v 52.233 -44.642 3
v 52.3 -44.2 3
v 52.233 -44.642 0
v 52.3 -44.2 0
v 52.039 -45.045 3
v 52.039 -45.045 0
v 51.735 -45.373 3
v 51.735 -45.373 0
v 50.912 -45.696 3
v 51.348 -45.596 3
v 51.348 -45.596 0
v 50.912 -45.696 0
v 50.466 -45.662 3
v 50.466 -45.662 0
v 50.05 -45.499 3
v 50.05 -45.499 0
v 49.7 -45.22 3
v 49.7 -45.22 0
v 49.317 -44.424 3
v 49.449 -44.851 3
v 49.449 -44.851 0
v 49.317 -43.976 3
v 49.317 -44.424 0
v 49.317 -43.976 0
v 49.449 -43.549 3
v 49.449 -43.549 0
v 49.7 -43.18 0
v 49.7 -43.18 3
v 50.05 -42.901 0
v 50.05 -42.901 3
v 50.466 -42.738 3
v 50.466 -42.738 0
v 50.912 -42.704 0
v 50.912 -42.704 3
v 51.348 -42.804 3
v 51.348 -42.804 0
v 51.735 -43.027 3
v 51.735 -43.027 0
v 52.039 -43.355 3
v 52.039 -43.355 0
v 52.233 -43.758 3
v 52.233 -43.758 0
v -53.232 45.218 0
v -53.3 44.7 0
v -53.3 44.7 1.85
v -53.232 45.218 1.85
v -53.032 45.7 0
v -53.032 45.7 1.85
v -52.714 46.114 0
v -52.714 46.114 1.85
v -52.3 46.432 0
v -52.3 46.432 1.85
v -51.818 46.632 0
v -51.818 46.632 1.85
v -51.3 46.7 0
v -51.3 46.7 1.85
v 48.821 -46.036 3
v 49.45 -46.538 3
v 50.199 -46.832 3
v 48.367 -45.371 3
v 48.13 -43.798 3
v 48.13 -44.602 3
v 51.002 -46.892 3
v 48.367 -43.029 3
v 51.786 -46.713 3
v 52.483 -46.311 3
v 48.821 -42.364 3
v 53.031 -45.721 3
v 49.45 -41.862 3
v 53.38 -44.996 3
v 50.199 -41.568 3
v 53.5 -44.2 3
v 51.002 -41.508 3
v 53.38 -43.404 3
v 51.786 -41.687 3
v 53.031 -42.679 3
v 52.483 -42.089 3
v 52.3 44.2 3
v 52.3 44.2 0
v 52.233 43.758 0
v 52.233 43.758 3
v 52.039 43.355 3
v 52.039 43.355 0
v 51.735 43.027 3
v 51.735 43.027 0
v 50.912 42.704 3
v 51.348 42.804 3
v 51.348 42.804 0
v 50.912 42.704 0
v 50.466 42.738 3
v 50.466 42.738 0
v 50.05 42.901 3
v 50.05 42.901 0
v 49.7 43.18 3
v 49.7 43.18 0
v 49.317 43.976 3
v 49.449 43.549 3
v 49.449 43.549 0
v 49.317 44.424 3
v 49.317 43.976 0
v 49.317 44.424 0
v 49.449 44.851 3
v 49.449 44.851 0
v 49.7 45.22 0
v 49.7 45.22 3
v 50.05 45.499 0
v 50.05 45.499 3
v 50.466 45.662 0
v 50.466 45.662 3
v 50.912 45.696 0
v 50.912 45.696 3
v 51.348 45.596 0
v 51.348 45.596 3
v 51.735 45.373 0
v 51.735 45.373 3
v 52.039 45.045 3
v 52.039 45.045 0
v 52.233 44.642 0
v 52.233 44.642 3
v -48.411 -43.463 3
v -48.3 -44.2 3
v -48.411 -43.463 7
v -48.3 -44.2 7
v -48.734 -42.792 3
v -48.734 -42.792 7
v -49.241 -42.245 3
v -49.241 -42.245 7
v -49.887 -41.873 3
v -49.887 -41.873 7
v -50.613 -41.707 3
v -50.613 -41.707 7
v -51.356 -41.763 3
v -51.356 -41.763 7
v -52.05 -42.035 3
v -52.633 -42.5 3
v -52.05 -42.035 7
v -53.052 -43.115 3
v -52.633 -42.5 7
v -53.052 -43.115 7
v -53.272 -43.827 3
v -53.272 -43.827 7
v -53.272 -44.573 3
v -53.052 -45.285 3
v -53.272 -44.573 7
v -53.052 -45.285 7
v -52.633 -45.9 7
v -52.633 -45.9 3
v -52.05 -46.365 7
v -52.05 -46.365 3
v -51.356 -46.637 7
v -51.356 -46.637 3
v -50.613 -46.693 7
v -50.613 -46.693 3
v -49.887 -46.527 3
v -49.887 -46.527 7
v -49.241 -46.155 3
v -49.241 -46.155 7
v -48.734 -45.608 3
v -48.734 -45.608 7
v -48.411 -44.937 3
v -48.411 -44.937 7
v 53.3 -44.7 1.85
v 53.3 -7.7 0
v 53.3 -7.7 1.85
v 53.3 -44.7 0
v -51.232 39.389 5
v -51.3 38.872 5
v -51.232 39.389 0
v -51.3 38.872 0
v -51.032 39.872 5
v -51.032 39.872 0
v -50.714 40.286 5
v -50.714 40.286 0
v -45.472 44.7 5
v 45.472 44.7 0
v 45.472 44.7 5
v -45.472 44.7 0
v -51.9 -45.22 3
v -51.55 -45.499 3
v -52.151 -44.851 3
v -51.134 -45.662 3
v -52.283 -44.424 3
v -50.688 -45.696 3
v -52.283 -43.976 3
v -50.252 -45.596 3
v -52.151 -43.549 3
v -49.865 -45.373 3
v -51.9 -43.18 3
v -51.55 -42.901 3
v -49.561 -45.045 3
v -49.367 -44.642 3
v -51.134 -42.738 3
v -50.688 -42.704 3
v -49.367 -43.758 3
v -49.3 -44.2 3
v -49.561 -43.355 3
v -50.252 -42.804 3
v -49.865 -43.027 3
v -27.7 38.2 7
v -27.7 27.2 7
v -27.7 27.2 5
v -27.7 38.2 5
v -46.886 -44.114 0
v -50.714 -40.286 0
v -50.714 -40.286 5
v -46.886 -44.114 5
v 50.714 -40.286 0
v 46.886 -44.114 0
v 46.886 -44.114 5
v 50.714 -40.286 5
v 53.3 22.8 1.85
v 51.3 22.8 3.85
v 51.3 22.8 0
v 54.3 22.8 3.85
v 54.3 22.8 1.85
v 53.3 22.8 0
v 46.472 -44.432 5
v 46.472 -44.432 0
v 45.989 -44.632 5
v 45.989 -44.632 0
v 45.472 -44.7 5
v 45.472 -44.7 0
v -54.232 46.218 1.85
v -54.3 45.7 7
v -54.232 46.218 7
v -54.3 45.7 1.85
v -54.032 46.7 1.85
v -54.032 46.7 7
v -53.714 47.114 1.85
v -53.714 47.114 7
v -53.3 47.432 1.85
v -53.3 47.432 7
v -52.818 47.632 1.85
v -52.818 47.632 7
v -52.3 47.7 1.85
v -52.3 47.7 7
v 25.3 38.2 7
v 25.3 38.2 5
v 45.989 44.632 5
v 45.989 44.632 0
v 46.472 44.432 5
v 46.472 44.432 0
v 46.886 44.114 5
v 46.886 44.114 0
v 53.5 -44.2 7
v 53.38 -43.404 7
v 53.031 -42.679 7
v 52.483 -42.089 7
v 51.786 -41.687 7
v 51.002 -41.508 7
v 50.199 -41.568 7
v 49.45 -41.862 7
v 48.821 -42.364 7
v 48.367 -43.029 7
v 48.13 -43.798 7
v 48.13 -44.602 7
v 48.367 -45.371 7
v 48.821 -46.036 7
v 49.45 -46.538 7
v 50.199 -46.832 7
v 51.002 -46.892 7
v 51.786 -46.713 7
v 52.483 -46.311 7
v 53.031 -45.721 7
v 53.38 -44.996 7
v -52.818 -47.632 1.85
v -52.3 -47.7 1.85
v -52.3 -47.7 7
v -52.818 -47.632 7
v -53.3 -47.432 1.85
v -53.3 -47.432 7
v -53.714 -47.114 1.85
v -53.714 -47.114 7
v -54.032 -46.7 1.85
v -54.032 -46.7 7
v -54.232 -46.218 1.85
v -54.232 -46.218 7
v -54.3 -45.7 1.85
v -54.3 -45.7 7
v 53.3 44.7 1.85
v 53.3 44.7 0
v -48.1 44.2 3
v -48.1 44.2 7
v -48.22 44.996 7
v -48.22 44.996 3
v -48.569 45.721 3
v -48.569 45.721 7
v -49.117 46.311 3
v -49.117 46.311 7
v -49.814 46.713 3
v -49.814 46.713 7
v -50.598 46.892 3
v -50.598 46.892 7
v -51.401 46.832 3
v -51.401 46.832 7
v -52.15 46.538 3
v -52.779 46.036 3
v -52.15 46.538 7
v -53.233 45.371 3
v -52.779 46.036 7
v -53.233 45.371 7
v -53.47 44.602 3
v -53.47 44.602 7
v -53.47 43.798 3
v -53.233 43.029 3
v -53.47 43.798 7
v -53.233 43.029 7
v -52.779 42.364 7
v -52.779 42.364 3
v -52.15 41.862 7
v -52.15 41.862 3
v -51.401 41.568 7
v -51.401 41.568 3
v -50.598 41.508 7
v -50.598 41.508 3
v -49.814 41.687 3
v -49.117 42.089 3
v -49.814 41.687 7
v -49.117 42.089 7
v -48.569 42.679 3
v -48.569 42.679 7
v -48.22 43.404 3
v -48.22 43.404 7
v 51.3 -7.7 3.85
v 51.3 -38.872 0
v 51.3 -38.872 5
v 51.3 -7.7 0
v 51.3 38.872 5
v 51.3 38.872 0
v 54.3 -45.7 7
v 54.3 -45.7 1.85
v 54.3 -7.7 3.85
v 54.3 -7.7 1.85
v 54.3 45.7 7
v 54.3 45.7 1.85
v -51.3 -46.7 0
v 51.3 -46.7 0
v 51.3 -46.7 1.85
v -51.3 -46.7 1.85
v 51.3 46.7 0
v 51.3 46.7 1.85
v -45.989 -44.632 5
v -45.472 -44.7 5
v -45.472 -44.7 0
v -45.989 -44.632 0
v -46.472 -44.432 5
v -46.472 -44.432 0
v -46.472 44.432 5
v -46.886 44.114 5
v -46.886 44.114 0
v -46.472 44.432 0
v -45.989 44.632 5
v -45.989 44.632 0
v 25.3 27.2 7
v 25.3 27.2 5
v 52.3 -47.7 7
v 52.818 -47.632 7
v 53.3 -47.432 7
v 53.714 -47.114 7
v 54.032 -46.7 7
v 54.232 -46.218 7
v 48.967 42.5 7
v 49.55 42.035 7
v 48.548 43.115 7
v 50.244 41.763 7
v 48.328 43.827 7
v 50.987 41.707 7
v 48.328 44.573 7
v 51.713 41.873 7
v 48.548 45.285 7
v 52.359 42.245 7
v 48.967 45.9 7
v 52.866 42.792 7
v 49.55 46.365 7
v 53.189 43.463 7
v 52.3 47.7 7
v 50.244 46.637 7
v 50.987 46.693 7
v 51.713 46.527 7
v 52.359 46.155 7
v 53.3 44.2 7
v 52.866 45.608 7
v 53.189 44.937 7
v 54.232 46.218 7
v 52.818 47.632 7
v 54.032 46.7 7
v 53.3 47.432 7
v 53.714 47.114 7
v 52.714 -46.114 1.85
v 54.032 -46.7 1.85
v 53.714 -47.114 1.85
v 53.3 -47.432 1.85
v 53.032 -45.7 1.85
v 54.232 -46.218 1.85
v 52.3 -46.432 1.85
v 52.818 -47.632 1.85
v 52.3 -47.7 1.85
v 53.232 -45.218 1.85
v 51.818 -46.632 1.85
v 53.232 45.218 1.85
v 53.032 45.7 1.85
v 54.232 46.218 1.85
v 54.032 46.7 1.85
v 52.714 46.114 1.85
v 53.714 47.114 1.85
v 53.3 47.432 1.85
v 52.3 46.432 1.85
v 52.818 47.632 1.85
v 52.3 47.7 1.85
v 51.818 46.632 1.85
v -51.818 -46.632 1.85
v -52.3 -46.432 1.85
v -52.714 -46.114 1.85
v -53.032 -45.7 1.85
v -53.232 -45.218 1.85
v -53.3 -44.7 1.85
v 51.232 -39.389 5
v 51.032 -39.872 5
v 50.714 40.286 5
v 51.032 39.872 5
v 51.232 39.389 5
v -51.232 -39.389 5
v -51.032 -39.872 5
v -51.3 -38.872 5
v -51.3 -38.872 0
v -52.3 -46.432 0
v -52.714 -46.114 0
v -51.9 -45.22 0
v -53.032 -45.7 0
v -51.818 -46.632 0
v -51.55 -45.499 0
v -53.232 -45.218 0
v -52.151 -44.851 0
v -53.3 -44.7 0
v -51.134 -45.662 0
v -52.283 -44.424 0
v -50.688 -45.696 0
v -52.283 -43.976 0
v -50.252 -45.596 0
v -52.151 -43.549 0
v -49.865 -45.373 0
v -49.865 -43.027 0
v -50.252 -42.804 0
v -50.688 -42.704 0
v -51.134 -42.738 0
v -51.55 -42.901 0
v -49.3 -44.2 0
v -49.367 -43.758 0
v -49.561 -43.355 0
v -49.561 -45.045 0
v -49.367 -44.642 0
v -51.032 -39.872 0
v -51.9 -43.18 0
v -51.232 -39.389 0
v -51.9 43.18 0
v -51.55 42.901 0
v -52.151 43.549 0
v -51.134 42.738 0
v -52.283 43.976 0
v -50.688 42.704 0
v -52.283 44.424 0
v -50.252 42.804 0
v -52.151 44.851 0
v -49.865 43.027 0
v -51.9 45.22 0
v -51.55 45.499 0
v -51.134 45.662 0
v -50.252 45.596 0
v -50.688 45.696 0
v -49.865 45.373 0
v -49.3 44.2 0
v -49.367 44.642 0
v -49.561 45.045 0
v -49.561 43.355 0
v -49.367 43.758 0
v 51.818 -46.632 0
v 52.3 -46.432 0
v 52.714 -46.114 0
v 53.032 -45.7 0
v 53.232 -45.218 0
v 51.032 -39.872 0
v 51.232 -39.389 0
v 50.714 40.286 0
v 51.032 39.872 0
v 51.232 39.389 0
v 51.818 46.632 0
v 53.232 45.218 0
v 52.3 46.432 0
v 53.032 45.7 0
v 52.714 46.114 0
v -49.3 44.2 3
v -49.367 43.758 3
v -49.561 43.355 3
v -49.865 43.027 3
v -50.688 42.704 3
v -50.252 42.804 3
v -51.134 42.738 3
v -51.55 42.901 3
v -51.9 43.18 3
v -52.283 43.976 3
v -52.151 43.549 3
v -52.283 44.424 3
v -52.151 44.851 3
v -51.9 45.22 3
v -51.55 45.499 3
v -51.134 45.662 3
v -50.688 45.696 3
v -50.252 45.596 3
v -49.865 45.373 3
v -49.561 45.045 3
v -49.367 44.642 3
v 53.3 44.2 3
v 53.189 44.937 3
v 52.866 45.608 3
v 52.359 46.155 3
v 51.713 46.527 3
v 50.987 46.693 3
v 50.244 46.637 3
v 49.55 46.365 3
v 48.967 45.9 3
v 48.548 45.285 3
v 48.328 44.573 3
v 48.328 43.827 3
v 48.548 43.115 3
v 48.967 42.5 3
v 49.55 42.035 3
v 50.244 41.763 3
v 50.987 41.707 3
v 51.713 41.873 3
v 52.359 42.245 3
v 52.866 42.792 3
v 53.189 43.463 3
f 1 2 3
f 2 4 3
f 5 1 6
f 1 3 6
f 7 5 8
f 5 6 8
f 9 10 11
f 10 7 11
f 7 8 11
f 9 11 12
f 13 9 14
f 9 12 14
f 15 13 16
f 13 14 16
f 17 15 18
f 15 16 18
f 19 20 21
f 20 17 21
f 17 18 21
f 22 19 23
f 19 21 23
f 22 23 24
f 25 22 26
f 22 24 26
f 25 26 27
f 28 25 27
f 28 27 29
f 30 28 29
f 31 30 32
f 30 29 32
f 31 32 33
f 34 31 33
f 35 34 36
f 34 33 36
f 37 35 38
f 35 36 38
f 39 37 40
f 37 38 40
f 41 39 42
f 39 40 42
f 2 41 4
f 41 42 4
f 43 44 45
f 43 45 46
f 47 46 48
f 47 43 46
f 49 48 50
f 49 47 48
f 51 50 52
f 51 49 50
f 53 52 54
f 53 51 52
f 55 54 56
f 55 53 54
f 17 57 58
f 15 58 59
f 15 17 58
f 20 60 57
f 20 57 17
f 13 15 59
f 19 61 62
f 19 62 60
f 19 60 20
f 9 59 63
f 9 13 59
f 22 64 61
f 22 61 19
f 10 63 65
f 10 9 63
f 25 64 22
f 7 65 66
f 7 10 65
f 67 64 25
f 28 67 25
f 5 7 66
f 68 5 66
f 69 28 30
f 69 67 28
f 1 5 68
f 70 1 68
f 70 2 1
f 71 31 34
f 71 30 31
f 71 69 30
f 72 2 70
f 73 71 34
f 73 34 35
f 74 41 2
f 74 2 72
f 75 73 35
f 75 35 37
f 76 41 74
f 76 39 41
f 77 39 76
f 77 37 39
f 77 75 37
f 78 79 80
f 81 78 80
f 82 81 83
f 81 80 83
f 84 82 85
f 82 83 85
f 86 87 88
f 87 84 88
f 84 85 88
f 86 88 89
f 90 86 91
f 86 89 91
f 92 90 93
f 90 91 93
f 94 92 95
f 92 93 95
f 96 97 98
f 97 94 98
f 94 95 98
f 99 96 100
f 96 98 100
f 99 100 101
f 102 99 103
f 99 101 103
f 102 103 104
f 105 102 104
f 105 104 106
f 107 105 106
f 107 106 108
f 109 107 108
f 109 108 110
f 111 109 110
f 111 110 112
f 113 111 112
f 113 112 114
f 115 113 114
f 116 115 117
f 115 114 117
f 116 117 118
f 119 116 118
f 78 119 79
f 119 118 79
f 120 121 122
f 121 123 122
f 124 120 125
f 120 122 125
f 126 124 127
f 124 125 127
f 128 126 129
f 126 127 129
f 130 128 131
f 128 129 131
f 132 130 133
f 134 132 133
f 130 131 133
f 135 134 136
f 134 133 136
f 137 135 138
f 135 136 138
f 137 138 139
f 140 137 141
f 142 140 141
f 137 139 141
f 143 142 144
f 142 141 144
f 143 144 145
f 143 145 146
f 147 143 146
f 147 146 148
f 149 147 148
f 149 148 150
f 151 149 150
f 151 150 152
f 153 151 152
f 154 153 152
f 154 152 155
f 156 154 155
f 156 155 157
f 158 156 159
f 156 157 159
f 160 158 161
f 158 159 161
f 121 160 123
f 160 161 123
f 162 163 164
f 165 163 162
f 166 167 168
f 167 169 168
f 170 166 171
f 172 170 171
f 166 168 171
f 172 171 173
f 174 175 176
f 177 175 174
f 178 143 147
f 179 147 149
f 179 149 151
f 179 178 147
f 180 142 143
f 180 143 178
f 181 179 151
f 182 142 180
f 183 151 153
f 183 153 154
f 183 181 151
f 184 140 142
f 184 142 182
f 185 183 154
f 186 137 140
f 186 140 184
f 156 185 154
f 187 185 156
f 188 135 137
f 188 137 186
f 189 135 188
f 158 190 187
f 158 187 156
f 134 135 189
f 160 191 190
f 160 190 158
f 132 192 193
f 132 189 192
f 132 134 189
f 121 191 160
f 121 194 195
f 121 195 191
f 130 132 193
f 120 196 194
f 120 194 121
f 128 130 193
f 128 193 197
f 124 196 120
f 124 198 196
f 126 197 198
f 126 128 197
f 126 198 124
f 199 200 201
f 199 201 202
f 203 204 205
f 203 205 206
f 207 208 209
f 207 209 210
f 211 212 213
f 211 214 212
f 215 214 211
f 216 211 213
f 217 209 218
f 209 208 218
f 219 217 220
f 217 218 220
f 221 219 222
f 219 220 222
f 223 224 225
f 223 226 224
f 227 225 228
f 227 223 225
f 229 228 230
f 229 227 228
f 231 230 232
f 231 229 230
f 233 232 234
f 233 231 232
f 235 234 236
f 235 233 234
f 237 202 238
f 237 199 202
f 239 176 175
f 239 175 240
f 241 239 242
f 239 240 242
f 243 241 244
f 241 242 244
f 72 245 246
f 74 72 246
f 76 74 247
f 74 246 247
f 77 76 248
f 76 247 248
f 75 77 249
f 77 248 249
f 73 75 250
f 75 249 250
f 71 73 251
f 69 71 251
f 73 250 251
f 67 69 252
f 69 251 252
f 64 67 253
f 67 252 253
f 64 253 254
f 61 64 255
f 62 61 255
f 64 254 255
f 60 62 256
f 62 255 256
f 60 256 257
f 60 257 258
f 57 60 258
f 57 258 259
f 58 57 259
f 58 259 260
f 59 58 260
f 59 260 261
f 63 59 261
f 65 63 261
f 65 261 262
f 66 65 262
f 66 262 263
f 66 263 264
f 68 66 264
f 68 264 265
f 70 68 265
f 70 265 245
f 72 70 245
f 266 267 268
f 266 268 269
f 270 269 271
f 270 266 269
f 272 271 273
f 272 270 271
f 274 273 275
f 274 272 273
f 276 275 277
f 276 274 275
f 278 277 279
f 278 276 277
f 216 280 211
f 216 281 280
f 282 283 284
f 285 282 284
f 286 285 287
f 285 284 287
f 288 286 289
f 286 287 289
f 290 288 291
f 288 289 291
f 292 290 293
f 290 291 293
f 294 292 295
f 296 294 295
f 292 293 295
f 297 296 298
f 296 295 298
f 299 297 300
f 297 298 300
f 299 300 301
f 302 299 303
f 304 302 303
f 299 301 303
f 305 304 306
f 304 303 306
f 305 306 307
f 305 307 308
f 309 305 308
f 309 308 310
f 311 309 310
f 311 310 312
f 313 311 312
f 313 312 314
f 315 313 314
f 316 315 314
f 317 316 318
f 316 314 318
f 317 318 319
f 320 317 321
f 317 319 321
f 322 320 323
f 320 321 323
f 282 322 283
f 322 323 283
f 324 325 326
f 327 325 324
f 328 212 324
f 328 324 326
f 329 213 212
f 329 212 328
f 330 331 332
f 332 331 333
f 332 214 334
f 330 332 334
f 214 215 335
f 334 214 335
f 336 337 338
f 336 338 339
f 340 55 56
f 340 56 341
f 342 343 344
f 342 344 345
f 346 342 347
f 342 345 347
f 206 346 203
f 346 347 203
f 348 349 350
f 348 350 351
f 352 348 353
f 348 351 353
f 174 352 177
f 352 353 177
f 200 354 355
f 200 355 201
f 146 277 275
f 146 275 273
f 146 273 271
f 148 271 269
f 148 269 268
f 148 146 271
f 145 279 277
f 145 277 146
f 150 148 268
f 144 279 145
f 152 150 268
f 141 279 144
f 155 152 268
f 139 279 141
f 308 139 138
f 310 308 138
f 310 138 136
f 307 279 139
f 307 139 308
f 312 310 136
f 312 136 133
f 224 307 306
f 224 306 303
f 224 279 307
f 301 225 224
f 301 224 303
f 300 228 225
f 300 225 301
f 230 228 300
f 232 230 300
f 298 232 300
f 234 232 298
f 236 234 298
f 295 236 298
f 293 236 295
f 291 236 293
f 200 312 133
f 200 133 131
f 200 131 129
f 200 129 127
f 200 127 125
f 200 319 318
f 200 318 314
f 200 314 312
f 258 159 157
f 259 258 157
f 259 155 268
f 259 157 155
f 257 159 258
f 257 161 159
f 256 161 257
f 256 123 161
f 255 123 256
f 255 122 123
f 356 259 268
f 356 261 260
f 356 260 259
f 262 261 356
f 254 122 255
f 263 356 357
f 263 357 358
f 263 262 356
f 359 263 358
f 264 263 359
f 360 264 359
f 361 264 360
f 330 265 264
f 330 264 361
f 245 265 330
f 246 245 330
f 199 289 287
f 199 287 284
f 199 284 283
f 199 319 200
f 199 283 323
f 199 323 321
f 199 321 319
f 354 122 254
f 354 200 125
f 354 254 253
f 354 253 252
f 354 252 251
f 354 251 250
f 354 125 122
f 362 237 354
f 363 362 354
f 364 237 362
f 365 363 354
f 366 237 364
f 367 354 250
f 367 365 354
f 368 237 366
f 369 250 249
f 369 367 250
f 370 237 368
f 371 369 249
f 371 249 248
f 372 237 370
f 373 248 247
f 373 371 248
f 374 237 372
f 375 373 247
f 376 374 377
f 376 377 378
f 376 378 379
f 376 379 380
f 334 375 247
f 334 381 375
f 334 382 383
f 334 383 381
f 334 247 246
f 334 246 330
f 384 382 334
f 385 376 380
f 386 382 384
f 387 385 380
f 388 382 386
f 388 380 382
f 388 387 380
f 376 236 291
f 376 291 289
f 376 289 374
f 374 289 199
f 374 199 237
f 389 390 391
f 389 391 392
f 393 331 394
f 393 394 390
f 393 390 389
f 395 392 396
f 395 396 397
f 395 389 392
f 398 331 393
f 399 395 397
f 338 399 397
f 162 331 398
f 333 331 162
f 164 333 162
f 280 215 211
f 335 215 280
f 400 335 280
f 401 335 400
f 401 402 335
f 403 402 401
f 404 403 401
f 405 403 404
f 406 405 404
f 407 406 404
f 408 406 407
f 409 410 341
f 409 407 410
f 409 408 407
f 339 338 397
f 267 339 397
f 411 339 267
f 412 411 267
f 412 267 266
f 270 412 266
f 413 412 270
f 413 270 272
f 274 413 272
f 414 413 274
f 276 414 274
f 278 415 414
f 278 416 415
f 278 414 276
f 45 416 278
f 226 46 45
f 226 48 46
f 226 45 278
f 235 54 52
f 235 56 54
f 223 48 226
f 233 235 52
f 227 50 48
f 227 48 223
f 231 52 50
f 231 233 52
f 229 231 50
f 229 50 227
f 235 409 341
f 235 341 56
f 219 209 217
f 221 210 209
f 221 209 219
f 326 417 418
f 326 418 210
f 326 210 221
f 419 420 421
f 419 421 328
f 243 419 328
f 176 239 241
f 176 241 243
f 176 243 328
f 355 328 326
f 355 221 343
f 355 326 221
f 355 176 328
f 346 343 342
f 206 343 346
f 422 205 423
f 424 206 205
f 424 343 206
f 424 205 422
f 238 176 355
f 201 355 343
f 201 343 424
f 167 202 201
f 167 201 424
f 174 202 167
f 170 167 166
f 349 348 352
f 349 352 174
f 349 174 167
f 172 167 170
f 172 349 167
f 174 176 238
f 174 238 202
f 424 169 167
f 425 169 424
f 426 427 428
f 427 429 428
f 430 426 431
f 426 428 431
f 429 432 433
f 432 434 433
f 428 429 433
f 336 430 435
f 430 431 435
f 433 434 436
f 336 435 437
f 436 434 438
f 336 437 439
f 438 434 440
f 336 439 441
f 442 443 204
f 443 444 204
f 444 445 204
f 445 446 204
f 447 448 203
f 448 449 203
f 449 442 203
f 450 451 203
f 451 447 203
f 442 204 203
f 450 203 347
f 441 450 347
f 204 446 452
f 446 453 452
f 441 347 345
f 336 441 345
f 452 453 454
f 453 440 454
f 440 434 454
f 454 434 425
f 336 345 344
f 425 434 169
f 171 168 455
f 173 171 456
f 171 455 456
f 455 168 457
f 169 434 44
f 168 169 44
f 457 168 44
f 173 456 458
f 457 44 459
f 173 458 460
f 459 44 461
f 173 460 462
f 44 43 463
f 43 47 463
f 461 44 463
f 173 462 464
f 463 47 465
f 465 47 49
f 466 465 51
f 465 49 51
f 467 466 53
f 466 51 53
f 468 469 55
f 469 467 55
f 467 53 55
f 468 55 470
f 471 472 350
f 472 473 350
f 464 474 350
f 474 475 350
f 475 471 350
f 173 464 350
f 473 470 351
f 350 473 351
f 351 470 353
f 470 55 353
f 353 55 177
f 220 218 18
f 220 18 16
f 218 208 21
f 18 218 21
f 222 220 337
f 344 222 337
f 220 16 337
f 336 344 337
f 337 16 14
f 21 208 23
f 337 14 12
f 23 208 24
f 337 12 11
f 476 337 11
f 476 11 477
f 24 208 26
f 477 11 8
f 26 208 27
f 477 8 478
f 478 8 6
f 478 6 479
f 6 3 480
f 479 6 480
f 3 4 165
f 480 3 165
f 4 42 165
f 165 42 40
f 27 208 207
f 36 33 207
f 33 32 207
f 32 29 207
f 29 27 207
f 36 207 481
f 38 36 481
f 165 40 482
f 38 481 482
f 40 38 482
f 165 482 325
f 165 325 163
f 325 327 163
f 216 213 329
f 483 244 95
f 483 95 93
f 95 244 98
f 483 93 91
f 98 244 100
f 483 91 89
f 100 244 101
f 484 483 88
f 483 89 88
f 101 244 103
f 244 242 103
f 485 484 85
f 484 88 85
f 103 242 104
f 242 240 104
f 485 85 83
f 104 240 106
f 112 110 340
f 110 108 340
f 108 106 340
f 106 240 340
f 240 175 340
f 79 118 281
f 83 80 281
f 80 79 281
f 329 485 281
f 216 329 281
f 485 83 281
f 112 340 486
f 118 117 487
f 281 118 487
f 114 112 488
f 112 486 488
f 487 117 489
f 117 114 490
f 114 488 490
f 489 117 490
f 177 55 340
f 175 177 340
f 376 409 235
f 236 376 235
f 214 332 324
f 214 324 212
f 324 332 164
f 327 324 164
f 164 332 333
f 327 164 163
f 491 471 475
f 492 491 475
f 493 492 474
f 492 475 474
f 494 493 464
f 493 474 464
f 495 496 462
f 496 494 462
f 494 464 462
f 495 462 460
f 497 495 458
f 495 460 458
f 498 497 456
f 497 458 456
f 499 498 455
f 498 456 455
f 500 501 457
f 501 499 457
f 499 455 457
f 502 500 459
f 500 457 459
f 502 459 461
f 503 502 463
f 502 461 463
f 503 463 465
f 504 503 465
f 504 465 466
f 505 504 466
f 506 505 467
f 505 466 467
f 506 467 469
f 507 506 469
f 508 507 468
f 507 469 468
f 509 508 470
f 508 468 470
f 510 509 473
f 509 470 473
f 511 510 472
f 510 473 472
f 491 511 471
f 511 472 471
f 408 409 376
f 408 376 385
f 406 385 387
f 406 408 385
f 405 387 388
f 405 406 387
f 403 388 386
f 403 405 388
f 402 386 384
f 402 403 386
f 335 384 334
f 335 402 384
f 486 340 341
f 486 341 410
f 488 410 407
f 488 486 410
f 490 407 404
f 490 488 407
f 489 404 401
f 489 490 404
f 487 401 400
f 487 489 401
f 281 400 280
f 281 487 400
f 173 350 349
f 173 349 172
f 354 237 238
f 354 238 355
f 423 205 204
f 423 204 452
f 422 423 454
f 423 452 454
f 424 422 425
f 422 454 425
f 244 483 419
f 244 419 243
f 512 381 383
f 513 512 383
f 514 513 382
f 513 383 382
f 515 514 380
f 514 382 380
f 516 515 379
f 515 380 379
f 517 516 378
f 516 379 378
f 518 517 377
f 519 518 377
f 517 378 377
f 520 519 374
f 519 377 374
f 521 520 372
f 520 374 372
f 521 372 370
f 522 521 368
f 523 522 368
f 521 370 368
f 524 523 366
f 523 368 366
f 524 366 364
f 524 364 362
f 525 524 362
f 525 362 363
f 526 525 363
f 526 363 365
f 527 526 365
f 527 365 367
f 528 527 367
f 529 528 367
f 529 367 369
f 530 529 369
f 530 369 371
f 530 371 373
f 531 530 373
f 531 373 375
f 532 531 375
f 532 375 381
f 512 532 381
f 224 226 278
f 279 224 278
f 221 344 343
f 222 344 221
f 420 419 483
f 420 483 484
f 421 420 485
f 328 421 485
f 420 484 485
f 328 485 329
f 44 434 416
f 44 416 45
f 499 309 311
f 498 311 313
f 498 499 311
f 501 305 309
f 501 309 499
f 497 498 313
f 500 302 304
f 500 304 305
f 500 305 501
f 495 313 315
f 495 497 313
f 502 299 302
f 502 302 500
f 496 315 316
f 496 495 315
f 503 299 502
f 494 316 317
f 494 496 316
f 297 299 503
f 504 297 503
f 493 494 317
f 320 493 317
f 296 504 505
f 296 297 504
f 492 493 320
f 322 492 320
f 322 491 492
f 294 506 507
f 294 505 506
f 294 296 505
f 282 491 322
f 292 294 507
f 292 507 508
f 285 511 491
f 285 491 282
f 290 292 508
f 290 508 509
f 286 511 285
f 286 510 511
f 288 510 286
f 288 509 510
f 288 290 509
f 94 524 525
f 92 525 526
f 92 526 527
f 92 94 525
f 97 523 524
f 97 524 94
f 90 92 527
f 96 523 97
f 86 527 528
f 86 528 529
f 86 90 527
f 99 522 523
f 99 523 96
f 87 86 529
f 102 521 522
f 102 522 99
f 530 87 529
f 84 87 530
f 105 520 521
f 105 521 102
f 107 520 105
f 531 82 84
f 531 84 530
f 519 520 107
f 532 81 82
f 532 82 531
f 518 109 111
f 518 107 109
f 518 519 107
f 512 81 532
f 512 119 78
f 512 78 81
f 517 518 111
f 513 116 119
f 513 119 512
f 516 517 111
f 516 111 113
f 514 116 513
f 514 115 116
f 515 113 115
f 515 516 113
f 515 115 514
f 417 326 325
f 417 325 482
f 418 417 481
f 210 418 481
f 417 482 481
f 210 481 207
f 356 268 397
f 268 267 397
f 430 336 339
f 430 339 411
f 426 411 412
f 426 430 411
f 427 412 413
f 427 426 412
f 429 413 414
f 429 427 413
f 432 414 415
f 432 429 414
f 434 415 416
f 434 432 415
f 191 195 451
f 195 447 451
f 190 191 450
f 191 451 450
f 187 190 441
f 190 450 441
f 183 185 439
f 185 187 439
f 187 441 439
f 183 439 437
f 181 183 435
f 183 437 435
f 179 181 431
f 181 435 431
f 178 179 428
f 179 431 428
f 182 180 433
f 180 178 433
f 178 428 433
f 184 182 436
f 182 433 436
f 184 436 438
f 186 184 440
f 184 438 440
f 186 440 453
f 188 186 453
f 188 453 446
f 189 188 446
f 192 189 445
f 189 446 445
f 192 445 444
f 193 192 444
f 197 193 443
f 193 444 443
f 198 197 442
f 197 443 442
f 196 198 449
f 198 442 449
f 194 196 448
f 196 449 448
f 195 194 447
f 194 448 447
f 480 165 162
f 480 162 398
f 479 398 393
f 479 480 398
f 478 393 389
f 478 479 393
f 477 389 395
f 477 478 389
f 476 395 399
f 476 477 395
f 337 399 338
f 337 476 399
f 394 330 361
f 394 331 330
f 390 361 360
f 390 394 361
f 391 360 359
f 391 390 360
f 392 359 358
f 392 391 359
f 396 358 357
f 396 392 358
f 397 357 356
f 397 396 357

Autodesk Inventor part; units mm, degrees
ref_plane "YZ Plane" through (0, 0, 0) normal (1, 0, 0) x (0, 1, 0)
ref_plane "XZ Plane" through (0, 0, 0) normal (0, 1, 0) x (-1, 0, 0)
ref_plane "XY Plane" through (0, 0, 0) normal (0, 0, 1) x (1, 0, 0)
sketch "Skizze1" plane through (0, 0, 0) normal (0, 0, 1) x (1, 0, 0)
  line L0 (52.3, 47.7) -> (-52.3, 47.7) projected
  arc A0 (-52.3, 47.7) -> (-54.3, 45.7) centre (-52.3, 45.7) ccw projected
  line L1 (54.3, 22.8) -> (54.3, 45.7) projected
  line L2 (-54.3, 45.7) -> (-54.3, -45.7) projected
  line L3 (-52.3, -47.7) -> (52.3, -47.7) projected
  arc A1 (-54.3, -45.7) -> (-52.3, -47.7) centre (-52.3, -45.7) ccw projected
  circle A2 centre (-50.8, -44.2) radius 1.5 projected
  circle A3 centre (50.8, 44.2) radius 1.5 projected
  arc A4 (52.3, -47.7) -> (54.3, -45.7) centre (52.3, -45.7) ccw projected
  line L4 (54.3, -45.7) -> (54.3, -8.2) projected
  line L5 (54.3, 22.8) -> (54.3, -8.2) projected
  arc A5 (54.3, 45.7) -> (52.3, 47.7) centre (52.3, 45.7) ccw projected
  circle A6 centre (-50.8, 44.2) radius 1.5 projected
  circle A7 centre (50.8, -44.2) radius 1.5 projected
  point P0 (0, 0)
extrude "Extrusion1" add sketch "Skizze1" along normal blind 7
sketch "Skizze2" plane through (0, 0, 0) normal (0, 0, -1) x (-1, 0, 0)
  line L0 (53.1, -44.5) -> (53.1, 44.5) projected
  line L1 (51.1, 46.5) -> (-51.1, 46.5) projected
  line L2 (-53.1, 44.5) -> (-53.1, -44.5) projected
  line L3 (-51.1, -46.5) -> (51.1, -46.5) projected
  line L4 (-51.3, -46.7) -> (51.3, -46.7)
  line L5 (53.3, -44.7) -> (53.3, 44.7)
  line L6 (51.3, 46.7) -> (-51.3, 46.7)
  line L7 (-53.3, 44.7) -> (-53.3, -44.7)
  line L8 (-53.3, -46.7) -> (53.3, 46.7) construction
  line L9 (53.3, -46.7) -> (-53.3, 46.7) construction
  arc A0 (53.3, 44.7) -> (51.3, 46.7) centre (51.3, 44.7) ccw
  arc A1 (-51.3, 46.7) -> (-53.3, 44.7) centre (-51.3, 44.7) ccw
  arc A2 (-53.3, -44.7) -> (-51.3, -46.7) centre (-51.3, -44.7) ccw
  arc A3 (51.3, -46.7) -> (53.3, -44.7) centre (51.3, -44.7) ccw
  line L10 (-56.7586, -49.6784) -> (56.7586, -49.6784)
  line L11 (56.7586, -49.6784) -> (56.7586, 49.6784)
  line L12 (56.7586, 49.6784) -> (-56.7586, 49.6784)
  line L13 (-56.7586, 49.6784) -> (-56.7586, -49.6784)
  line L14 (-56.7586, -49.6784) -> (56.7586, 49.6784) construction
  line L15 (56.7586, -49.6784) -> (-56.7586, 49.6784) construction
  point P0 (0, 0)
  dimension "d2" = 0.2
  dimension "d3" = 0.2
  dimension "d4" = 2
extrude "Extrusion2" cut sketch "Skizze2" against normal blind 1.85
sketch "Skizze3" plane through (0, 0, 0) normal (0, 0, -1) x (-1, 0, 0)
  line L0 (-50.7142, 40.2858) -> (-46.8858, 44.1142)
  arc A0 (-45.4716, 44.7) -> (-46.8858, 44.1142) centre (-45.4716, 42.7) ccw
  line L1 (-45.4716, 44.7) -> (45.4716, 44.7)
  arc A1 (-50.7142, 40.2858) -> (-51.3, 38.8716) centre (-49.3, 38.8716) ccw
  line L2 (-51.3, -38.8716) -> (-51.3, 38.8716)
  line L3 (50.7142, -40.2858) -> (46.8858, -44.1142)
  arc A2 (50.7142, -40.2858) -> (51.3, -38.8716) centre (49.3, -38.8716) ccw
  line L4 (51.3, 38.8716) -> (51.3, -38.8716)
  arc A3 (45.4716, -44.7) -> (46.8858, -44.1142) centre (45.4716, -42.7) ccw
  line L5 (45.4716, -44.7) -> (-45.4716, -44.7)
  arc A4 (51.3, 38.8716) -> (50.7142, 40.2858) centre (49.3, 38.8716) ccw
  line L6 (46.8858, 44.1142) -> (50.7142, 40.2858)
  arc A5 (46.8858, 44.1142) -> (45.4716, 44.7) centre (45.4716, 42.7) ccw
  arc A6 (-46.8858, -44.1142) -> (-45.4716, -44.7) centre (-45.4716, -42.7) ccw
  line L7 (-46.8858, -44.1142) -> (-50.7142, -40.2858)
  arc A7 (-51.3, -38.8716) -> (-50.7142, -40.2858) centre (-49.3, -38.8716) ccw
  circle A8 centre (-50.8, -44.2) radius 1.5
  circle A9 centre (-50.8, 44.2) radius 1.5
  circle A10 centre (50.8, 44.2) radius 1.5
  circle A11 centre (50.8, -44.2) radius 1.5
  point P0 (0, 0)
extrude "Extrusion3" cut sketch "Skizze3" against normal blind 5 contours L0 A0 L1 A5 L6 A4 L4 A2 L3 A3 L5 A6 L7 A7 L2 A1
sketch "Skizze4" plane through (54.3, -45.7, 7) normal (1, 0, 0) x (0, 0, -1)
  line L0 (3.15, 38) -> (3.15, 68.5)
  line L1 (0, 0) -> (0, 91.4) projected
  line L2 (7, 90.4) -> (7, 1) projected
  line L3 (5.15, -2) -> (0, -2) projected
  line L4 (3.15, 68.5) -> (7, 68.5)
  line L5 (7, 1) -> (7, 90.4) projected
  line L6 (3.15, 38) -> (7, 38)
  line L7 (7, 68.5) -> (7, 38)
  point P0 (7, 45.7)
  dimension "d11" = 3.85
  dimension "d13" = 30.5
  dimension "d14" = 40
extrude "Extrusion4" cut sketch "Skizze4" against normal up to next
sketch "Skizze5" plane through (0, 0, 7) normal (0, 0, 1) x (1, 0, 0)
  circle A0 centre (-50.8, 44.2) radius 1.5 projected
  circle A1 centre (-50.8, 44.2) radius 2.7
  line L0 (52.3, 47.7) -> (-52.3, 47.7) projected
  circle A2 centre (50.8, 44.2) radius 1.5 projected
  circle A3 centre (50.8, 44.2) radius 2.5
  line L1 (-51.3, 46.7) -> (51.3, 46.7) projected
  circle A4 centre (50.8, -44.2) radius 1.5 projected
  circle A5 centre (50.8, -44.2) radius 2.7
  line L2 (54.3, -45.7) -> (54.3, 45.7) projected
  circle A6 centre (-50.8, -44.2) radius 1.5 projected
  circle A7 centre (-50.8, -44.2) radius 2.5
  line L3 (51.3, -46.7) -> (-51.3, -46.7) projected
  point P0 (0, 0)
  dimension "d17" = 0.8
  dimension "d18" = 0.8
extrude "Extrusion5" cut sketch "Skizze5" against normal blind 4
sketch "Skizze6" plane through (0, 0, 7) normal (0, 0, 1) x (1, 0, 0)
  line L0 (-27.7, 38.2) -> (25.3, 38.2)
  line L1 (25.3, 38.2) -> (25.3, 27.2)
  line L2 (25.3, 27.2) -> (-27.7, 27.2)
  line L3 (-27.7, 27.2) -> (-27.7, 38.2)
  line L4 (54.3, -45.7) -> (54.3, 45.7) projected
  line L5 (52.3, 47.7) -> (-52.3, 47.7) projected
  point P0 (0, 0)
  dimension "d21" = 53
  dimension "d22" = 11
  dimension "d23" = 29
  dimension "d24" = 9.5
extrude "Extrusion6" cut sketch "Skizze6" against normal up to next
properties part number "case rear" material "ABS-Kunststoff"
